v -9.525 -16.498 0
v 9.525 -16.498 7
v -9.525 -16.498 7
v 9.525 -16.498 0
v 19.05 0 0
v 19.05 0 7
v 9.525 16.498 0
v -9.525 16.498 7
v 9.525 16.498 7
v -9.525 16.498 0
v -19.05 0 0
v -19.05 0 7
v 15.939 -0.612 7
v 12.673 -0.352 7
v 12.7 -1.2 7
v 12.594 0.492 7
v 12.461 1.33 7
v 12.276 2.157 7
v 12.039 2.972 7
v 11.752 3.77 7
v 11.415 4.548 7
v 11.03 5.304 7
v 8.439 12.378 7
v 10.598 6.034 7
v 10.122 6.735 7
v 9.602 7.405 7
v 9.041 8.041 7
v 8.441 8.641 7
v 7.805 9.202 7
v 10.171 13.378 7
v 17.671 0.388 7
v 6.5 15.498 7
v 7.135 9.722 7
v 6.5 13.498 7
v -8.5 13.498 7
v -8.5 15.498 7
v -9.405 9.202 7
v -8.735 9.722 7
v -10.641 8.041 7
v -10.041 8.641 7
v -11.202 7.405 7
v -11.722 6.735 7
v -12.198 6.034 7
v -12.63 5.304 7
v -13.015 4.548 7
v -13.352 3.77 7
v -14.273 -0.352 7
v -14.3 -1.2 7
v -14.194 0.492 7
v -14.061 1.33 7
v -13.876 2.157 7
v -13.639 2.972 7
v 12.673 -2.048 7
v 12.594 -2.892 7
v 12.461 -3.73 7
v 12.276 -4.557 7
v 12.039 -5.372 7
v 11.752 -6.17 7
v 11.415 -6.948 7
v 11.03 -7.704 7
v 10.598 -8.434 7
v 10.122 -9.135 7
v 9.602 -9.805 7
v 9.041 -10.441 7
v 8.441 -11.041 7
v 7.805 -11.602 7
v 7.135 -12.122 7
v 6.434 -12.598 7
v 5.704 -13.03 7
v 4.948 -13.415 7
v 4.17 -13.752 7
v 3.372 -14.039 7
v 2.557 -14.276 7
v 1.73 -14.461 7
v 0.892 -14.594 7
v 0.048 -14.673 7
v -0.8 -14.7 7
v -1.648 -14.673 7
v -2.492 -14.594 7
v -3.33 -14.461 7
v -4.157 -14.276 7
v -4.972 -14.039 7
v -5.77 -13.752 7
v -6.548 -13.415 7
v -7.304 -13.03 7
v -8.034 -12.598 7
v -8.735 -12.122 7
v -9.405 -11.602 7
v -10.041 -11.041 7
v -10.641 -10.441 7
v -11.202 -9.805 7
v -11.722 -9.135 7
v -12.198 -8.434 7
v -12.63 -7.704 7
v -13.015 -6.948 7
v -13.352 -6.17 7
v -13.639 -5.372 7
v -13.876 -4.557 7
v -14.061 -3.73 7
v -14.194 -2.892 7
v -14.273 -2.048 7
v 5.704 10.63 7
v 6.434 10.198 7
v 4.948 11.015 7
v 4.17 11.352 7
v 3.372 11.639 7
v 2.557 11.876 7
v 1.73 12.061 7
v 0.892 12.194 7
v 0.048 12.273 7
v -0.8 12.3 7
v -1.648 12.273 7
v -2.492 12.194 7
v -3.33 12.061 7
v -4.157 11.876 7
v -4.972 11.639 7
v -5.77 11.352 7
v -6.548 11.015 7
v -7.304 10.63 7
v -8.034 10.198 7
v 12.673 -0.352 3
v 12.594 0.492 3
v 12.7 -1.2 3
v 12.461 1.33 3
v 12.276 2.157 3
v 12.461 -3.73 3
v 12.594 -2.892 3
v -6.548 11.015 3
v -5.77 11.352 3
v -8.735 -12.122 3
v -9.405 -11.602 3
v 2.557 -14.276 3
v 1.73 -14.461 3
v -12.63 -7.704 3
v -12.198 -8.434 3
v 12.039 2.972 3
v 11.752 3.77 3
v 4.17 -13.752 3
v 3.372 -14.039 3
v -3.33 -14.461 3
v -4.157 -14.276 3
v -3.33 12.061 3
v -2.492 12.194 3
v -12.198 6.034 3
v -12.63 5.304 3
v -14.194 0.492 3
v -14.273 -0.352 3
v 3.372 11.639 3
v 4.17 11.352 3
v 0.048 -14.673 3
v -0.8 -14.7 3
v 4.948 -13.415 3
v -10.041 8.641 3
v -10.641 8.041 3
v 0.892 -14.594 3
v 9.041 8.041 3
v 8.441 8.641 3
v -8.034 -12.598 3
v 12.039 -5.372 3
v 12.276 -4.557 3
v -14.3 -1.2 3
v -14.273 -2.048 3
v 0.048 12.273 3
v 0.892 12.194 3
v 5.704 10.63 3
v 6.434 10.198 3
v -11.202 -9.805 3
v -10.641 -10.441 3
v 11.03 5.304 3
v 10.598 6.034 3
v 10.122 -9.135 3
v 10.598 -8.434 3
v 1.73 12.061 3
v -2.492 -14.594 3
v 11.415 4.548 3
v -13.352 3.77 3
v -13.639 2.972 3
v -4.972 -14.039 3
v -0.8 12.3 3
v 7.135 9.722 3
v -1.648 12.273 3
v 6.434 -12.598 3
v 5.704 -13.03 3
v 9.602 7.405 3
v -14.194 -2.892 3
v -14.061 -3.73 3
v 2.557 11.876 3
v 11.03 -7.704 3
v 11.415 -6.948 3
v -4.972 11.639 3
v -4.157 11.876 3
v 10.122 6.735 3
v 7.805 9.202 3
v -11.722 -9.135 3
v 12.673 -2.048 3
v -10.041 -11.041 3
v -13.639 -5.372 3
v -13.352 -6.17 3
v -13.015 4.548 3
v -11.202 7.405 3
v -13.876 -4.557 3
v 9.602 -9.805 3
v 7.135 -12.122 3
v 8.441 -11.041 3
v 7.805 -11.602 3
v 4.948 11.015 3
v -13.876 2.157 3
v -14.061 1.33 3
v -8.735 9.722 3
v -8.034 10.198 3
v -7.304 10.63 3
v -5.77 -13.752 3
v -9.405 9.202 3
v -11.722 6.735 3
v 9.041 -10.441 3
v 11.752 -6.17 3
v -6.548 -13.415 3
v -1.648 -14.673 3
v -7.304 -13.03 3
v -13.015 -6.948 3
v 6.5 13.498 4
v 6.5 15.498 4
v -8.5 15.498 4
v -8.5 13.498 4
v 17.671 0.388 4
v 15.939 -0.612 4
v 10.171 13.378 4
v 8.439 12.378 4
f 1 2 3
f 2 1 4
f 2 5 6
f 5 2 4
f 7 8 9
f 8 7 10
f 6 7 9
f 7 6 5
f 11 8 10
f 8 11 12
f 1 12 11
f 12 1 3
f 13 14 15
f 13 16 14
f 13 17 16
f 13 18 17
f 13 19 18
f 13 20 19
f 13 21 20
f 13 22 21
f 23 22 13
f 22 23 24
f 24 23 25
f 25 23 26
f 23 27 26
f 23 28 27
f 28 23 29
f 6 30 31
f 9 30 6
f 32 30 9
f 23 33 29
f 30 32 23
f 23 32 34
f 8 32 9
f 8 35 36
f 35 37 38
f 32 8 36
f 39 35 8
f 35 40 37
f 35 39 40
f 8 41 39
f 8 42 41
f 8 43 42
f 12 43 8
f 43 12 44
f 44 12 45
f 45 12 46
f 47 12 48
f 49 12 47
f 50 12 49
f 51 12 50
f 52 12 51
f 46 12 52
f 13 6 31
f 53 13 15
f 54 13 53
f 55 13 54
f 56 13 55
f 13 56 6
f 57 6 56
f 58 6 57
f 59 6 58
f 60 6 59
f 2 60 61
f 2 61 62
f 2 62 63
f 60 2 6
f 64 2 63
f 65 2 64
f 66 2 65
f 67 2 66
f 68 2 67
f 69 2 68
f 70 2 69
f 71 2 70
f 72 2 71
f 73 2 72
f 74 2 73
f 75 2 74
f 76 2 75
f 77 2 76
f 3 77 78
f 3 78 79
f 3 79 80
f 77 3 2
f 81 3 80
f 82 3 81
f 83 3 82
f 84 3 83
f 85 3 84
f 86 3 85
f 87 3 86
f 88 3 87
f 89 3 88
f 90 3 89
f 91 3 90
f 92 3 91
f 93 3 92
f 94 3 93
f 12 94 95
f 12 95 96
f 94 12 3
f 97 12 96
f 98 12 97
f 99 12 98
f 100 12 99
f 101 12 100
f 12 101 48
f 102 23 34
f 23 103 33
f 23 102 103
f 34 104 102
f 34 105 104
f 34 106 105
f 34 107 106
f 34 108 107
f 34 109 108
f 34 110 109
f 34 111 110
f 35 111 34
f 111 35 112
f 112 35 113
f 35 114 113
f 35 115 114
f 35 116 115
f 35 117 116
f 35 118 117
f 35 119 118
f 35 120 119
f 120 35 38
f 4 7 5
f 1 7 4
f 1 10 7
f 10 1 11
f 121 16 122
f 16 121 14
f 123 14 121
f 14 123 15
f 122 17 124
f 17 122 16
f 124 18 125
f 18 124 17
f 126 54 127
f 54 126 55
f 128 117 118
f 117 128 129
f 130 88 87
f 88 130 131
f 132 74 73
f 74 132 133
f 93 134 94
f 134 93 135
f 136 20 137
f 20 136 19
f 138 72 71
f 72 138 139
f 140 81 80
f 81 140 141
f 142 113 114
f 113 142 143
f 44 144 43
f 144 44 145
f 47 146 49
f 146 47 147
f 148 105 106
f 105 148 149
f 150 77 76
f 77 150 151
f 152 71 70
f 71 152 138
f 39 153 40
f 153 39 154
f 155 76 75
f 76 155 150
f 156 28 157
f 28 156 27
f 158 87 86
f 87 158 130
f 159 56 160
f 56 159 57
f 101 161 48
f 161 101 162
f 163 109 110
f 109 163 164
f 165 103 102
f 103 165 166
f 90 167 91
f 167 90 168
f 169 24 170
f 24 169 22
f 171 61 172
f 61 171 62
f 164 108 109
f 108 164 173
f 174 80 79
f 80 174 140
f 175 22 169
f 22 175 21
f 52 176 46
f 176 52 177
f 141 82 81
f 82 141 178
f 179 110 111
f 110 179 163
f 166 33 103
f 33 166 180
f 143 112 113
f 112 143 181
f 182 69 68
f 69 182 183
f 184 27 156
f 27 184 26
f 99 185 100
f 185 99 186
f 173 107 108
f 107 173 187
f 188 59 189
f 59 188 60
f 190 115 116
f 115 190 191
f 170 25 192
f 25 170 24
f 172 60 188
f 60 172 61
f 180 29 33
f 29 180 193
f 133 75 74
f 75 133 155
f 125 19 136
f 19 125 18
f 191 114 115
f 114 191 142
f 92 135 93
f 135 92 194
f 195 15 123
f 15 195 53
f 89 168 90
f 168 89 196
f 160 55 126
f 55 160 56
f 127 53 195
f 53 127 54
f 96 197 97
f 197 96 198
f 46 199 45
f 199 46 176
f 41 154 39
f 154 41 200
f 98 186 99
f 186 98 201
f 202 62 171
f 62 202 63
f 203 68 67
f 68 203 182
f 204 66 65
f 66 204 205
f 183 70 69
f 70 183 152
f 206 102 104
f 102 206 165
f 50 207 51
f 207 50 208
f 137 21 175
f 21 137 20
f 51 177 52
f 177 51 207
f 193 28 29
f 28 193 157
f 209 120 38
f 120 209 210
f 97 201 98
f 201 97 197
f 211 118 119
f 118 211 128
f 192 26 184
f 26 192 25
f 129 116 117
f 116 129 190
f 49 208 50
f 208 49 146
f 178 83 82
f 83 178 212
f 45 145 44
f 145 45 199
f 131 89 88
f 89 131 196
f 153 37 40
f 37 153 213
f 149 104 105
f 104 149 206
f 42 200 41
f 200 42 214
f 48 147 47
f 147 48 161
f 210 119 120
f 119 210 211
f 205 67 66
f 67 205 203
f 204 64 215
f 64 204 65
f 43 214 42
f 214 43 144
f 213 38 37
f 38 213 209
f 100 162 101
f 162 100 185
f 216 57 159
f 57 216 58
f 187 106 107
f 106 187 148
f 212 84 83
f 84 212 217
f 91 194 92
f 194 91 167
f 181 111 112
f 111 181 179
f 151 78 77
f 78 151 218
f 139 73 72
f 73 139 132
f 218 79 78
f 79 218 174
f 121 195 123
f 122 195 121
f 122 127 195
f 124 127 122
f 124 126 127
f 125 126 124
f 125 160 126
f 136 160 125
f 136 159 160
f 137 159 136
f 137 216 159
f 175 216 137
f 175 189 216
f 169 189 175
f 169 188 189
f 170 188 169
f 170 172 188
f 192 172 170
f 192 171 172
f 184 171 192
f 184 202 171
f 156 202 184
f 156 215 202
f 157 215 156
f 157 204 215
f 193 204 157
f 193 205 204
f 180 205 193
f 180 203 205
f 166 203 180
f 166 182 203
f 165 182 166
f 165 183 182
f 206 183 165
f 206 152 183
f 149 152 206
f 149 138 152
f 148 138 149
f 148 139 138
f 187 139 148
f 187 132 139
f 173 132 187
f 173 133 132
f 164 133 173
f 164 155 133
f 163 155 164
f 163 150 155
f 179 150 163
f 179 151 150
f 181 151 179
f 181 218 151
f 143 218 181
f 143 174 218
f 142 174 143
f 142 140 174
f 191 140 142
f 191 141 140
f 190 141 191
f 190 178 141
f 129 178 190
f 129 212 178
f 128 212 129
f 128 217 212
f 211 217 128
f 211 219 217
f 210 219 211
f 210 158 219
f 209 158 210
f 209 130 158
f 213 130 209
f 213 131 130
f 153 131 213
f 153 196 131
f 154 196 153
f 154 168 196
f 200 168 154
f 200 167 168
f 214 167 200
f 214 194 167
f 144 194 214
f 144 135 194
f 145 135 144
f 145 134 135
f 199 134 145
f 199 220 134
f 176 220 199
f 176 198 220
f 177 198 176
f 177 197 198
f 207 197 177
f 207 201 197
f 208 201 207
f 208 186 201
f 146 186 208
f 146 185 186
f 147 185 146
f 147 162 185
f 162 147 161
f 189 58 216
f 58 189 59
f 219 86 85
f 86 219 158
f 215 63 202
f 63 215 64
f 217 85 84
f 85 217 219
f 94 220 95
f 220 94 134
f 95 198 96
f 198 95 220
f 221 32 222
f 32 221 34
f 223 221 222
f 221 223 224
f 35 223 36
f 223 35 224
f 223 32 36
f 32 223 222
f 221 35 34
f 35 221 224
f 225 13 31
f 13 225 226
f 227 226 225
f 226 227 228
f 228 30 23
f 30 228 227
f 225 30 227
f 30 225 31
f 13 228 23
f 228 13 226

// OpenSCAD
// Written by xoque (mwifall@gmail.com)
/**************************************
Gloomhaven miniature holder with condition tile holders

I created this so we could see what conditions our characters had while viewing the game board.  I would always forgot to look at my character mat to look for conditions.  I found that the diameter of the miniature bases have small differences, and I had to adjust them slightly to get them to work well, otherwise it was too loose.

**************************************/

// This is the diameter of the inner cylinder
// 27 worked well for SpellWeaver
// 26.6 worked well for me for the Brute
MiniDiameter=27;

// Hexagon Diameter
HexDiameter=38.1;
// Length of half the hexagon from end to end
HexHalfLength=sqrt((pow(HexDiameter,2))-(pow(HexDiameter/2,2)));
// Hexagon Height
HexHeight=7;
HexBaseHeight=3;

// Condition Cutout
CutoutHeight=3;
ConditionLength=15;

difference() {
    
    union() {
        //The Base Hexagon
        cylinder(h=HexHeight,r=HexDiameter/2,$fn=6);
        //The condition holders
        rotate([0,0,-60]) {
            translate([-HexDiameter/4+(HexDiameter/4-ConditionLength/2),sqrt(pow(HexDiameter/2,2)-pow(HexDiameter/4,2))-3,HexHeight-CutoutHeight]) {
                color("red")
                    cube([ConditionLength,2,CutoutHeight]);
        }
    }
}
    translate([-0.8,-1.2,HexBaseHeight])
        cylinder(h=HexHeight-HexBaseHeight,d=MiniDiameter,$fn=100);
    translate([-HexDiameter/4+(HexDiameter/4-ConditionLength/2)-1,sqrt(pow(HexDiameter/2,2)-pow(HexDiameter/4,2))-3,HexHeight-CutoutHeight]) {
        rotate([0,0,0]) {
            color("red")
                cube([ConditionLength,2,CutoutHeight]);
        }
    }
    rotate([0,0,-60]) {
        translate([-HexDiameter/4+(HexDiameter/4-ConditionLength/2)+1,sqrt(pow(HexDiameter/2,2)-pow(HexDiameter/4,2))-3,HexHeight-CutoutHeight]) {
            color("red")
                cube([ConditionLength,2,CutoutHeight]);
            }
    }
}
